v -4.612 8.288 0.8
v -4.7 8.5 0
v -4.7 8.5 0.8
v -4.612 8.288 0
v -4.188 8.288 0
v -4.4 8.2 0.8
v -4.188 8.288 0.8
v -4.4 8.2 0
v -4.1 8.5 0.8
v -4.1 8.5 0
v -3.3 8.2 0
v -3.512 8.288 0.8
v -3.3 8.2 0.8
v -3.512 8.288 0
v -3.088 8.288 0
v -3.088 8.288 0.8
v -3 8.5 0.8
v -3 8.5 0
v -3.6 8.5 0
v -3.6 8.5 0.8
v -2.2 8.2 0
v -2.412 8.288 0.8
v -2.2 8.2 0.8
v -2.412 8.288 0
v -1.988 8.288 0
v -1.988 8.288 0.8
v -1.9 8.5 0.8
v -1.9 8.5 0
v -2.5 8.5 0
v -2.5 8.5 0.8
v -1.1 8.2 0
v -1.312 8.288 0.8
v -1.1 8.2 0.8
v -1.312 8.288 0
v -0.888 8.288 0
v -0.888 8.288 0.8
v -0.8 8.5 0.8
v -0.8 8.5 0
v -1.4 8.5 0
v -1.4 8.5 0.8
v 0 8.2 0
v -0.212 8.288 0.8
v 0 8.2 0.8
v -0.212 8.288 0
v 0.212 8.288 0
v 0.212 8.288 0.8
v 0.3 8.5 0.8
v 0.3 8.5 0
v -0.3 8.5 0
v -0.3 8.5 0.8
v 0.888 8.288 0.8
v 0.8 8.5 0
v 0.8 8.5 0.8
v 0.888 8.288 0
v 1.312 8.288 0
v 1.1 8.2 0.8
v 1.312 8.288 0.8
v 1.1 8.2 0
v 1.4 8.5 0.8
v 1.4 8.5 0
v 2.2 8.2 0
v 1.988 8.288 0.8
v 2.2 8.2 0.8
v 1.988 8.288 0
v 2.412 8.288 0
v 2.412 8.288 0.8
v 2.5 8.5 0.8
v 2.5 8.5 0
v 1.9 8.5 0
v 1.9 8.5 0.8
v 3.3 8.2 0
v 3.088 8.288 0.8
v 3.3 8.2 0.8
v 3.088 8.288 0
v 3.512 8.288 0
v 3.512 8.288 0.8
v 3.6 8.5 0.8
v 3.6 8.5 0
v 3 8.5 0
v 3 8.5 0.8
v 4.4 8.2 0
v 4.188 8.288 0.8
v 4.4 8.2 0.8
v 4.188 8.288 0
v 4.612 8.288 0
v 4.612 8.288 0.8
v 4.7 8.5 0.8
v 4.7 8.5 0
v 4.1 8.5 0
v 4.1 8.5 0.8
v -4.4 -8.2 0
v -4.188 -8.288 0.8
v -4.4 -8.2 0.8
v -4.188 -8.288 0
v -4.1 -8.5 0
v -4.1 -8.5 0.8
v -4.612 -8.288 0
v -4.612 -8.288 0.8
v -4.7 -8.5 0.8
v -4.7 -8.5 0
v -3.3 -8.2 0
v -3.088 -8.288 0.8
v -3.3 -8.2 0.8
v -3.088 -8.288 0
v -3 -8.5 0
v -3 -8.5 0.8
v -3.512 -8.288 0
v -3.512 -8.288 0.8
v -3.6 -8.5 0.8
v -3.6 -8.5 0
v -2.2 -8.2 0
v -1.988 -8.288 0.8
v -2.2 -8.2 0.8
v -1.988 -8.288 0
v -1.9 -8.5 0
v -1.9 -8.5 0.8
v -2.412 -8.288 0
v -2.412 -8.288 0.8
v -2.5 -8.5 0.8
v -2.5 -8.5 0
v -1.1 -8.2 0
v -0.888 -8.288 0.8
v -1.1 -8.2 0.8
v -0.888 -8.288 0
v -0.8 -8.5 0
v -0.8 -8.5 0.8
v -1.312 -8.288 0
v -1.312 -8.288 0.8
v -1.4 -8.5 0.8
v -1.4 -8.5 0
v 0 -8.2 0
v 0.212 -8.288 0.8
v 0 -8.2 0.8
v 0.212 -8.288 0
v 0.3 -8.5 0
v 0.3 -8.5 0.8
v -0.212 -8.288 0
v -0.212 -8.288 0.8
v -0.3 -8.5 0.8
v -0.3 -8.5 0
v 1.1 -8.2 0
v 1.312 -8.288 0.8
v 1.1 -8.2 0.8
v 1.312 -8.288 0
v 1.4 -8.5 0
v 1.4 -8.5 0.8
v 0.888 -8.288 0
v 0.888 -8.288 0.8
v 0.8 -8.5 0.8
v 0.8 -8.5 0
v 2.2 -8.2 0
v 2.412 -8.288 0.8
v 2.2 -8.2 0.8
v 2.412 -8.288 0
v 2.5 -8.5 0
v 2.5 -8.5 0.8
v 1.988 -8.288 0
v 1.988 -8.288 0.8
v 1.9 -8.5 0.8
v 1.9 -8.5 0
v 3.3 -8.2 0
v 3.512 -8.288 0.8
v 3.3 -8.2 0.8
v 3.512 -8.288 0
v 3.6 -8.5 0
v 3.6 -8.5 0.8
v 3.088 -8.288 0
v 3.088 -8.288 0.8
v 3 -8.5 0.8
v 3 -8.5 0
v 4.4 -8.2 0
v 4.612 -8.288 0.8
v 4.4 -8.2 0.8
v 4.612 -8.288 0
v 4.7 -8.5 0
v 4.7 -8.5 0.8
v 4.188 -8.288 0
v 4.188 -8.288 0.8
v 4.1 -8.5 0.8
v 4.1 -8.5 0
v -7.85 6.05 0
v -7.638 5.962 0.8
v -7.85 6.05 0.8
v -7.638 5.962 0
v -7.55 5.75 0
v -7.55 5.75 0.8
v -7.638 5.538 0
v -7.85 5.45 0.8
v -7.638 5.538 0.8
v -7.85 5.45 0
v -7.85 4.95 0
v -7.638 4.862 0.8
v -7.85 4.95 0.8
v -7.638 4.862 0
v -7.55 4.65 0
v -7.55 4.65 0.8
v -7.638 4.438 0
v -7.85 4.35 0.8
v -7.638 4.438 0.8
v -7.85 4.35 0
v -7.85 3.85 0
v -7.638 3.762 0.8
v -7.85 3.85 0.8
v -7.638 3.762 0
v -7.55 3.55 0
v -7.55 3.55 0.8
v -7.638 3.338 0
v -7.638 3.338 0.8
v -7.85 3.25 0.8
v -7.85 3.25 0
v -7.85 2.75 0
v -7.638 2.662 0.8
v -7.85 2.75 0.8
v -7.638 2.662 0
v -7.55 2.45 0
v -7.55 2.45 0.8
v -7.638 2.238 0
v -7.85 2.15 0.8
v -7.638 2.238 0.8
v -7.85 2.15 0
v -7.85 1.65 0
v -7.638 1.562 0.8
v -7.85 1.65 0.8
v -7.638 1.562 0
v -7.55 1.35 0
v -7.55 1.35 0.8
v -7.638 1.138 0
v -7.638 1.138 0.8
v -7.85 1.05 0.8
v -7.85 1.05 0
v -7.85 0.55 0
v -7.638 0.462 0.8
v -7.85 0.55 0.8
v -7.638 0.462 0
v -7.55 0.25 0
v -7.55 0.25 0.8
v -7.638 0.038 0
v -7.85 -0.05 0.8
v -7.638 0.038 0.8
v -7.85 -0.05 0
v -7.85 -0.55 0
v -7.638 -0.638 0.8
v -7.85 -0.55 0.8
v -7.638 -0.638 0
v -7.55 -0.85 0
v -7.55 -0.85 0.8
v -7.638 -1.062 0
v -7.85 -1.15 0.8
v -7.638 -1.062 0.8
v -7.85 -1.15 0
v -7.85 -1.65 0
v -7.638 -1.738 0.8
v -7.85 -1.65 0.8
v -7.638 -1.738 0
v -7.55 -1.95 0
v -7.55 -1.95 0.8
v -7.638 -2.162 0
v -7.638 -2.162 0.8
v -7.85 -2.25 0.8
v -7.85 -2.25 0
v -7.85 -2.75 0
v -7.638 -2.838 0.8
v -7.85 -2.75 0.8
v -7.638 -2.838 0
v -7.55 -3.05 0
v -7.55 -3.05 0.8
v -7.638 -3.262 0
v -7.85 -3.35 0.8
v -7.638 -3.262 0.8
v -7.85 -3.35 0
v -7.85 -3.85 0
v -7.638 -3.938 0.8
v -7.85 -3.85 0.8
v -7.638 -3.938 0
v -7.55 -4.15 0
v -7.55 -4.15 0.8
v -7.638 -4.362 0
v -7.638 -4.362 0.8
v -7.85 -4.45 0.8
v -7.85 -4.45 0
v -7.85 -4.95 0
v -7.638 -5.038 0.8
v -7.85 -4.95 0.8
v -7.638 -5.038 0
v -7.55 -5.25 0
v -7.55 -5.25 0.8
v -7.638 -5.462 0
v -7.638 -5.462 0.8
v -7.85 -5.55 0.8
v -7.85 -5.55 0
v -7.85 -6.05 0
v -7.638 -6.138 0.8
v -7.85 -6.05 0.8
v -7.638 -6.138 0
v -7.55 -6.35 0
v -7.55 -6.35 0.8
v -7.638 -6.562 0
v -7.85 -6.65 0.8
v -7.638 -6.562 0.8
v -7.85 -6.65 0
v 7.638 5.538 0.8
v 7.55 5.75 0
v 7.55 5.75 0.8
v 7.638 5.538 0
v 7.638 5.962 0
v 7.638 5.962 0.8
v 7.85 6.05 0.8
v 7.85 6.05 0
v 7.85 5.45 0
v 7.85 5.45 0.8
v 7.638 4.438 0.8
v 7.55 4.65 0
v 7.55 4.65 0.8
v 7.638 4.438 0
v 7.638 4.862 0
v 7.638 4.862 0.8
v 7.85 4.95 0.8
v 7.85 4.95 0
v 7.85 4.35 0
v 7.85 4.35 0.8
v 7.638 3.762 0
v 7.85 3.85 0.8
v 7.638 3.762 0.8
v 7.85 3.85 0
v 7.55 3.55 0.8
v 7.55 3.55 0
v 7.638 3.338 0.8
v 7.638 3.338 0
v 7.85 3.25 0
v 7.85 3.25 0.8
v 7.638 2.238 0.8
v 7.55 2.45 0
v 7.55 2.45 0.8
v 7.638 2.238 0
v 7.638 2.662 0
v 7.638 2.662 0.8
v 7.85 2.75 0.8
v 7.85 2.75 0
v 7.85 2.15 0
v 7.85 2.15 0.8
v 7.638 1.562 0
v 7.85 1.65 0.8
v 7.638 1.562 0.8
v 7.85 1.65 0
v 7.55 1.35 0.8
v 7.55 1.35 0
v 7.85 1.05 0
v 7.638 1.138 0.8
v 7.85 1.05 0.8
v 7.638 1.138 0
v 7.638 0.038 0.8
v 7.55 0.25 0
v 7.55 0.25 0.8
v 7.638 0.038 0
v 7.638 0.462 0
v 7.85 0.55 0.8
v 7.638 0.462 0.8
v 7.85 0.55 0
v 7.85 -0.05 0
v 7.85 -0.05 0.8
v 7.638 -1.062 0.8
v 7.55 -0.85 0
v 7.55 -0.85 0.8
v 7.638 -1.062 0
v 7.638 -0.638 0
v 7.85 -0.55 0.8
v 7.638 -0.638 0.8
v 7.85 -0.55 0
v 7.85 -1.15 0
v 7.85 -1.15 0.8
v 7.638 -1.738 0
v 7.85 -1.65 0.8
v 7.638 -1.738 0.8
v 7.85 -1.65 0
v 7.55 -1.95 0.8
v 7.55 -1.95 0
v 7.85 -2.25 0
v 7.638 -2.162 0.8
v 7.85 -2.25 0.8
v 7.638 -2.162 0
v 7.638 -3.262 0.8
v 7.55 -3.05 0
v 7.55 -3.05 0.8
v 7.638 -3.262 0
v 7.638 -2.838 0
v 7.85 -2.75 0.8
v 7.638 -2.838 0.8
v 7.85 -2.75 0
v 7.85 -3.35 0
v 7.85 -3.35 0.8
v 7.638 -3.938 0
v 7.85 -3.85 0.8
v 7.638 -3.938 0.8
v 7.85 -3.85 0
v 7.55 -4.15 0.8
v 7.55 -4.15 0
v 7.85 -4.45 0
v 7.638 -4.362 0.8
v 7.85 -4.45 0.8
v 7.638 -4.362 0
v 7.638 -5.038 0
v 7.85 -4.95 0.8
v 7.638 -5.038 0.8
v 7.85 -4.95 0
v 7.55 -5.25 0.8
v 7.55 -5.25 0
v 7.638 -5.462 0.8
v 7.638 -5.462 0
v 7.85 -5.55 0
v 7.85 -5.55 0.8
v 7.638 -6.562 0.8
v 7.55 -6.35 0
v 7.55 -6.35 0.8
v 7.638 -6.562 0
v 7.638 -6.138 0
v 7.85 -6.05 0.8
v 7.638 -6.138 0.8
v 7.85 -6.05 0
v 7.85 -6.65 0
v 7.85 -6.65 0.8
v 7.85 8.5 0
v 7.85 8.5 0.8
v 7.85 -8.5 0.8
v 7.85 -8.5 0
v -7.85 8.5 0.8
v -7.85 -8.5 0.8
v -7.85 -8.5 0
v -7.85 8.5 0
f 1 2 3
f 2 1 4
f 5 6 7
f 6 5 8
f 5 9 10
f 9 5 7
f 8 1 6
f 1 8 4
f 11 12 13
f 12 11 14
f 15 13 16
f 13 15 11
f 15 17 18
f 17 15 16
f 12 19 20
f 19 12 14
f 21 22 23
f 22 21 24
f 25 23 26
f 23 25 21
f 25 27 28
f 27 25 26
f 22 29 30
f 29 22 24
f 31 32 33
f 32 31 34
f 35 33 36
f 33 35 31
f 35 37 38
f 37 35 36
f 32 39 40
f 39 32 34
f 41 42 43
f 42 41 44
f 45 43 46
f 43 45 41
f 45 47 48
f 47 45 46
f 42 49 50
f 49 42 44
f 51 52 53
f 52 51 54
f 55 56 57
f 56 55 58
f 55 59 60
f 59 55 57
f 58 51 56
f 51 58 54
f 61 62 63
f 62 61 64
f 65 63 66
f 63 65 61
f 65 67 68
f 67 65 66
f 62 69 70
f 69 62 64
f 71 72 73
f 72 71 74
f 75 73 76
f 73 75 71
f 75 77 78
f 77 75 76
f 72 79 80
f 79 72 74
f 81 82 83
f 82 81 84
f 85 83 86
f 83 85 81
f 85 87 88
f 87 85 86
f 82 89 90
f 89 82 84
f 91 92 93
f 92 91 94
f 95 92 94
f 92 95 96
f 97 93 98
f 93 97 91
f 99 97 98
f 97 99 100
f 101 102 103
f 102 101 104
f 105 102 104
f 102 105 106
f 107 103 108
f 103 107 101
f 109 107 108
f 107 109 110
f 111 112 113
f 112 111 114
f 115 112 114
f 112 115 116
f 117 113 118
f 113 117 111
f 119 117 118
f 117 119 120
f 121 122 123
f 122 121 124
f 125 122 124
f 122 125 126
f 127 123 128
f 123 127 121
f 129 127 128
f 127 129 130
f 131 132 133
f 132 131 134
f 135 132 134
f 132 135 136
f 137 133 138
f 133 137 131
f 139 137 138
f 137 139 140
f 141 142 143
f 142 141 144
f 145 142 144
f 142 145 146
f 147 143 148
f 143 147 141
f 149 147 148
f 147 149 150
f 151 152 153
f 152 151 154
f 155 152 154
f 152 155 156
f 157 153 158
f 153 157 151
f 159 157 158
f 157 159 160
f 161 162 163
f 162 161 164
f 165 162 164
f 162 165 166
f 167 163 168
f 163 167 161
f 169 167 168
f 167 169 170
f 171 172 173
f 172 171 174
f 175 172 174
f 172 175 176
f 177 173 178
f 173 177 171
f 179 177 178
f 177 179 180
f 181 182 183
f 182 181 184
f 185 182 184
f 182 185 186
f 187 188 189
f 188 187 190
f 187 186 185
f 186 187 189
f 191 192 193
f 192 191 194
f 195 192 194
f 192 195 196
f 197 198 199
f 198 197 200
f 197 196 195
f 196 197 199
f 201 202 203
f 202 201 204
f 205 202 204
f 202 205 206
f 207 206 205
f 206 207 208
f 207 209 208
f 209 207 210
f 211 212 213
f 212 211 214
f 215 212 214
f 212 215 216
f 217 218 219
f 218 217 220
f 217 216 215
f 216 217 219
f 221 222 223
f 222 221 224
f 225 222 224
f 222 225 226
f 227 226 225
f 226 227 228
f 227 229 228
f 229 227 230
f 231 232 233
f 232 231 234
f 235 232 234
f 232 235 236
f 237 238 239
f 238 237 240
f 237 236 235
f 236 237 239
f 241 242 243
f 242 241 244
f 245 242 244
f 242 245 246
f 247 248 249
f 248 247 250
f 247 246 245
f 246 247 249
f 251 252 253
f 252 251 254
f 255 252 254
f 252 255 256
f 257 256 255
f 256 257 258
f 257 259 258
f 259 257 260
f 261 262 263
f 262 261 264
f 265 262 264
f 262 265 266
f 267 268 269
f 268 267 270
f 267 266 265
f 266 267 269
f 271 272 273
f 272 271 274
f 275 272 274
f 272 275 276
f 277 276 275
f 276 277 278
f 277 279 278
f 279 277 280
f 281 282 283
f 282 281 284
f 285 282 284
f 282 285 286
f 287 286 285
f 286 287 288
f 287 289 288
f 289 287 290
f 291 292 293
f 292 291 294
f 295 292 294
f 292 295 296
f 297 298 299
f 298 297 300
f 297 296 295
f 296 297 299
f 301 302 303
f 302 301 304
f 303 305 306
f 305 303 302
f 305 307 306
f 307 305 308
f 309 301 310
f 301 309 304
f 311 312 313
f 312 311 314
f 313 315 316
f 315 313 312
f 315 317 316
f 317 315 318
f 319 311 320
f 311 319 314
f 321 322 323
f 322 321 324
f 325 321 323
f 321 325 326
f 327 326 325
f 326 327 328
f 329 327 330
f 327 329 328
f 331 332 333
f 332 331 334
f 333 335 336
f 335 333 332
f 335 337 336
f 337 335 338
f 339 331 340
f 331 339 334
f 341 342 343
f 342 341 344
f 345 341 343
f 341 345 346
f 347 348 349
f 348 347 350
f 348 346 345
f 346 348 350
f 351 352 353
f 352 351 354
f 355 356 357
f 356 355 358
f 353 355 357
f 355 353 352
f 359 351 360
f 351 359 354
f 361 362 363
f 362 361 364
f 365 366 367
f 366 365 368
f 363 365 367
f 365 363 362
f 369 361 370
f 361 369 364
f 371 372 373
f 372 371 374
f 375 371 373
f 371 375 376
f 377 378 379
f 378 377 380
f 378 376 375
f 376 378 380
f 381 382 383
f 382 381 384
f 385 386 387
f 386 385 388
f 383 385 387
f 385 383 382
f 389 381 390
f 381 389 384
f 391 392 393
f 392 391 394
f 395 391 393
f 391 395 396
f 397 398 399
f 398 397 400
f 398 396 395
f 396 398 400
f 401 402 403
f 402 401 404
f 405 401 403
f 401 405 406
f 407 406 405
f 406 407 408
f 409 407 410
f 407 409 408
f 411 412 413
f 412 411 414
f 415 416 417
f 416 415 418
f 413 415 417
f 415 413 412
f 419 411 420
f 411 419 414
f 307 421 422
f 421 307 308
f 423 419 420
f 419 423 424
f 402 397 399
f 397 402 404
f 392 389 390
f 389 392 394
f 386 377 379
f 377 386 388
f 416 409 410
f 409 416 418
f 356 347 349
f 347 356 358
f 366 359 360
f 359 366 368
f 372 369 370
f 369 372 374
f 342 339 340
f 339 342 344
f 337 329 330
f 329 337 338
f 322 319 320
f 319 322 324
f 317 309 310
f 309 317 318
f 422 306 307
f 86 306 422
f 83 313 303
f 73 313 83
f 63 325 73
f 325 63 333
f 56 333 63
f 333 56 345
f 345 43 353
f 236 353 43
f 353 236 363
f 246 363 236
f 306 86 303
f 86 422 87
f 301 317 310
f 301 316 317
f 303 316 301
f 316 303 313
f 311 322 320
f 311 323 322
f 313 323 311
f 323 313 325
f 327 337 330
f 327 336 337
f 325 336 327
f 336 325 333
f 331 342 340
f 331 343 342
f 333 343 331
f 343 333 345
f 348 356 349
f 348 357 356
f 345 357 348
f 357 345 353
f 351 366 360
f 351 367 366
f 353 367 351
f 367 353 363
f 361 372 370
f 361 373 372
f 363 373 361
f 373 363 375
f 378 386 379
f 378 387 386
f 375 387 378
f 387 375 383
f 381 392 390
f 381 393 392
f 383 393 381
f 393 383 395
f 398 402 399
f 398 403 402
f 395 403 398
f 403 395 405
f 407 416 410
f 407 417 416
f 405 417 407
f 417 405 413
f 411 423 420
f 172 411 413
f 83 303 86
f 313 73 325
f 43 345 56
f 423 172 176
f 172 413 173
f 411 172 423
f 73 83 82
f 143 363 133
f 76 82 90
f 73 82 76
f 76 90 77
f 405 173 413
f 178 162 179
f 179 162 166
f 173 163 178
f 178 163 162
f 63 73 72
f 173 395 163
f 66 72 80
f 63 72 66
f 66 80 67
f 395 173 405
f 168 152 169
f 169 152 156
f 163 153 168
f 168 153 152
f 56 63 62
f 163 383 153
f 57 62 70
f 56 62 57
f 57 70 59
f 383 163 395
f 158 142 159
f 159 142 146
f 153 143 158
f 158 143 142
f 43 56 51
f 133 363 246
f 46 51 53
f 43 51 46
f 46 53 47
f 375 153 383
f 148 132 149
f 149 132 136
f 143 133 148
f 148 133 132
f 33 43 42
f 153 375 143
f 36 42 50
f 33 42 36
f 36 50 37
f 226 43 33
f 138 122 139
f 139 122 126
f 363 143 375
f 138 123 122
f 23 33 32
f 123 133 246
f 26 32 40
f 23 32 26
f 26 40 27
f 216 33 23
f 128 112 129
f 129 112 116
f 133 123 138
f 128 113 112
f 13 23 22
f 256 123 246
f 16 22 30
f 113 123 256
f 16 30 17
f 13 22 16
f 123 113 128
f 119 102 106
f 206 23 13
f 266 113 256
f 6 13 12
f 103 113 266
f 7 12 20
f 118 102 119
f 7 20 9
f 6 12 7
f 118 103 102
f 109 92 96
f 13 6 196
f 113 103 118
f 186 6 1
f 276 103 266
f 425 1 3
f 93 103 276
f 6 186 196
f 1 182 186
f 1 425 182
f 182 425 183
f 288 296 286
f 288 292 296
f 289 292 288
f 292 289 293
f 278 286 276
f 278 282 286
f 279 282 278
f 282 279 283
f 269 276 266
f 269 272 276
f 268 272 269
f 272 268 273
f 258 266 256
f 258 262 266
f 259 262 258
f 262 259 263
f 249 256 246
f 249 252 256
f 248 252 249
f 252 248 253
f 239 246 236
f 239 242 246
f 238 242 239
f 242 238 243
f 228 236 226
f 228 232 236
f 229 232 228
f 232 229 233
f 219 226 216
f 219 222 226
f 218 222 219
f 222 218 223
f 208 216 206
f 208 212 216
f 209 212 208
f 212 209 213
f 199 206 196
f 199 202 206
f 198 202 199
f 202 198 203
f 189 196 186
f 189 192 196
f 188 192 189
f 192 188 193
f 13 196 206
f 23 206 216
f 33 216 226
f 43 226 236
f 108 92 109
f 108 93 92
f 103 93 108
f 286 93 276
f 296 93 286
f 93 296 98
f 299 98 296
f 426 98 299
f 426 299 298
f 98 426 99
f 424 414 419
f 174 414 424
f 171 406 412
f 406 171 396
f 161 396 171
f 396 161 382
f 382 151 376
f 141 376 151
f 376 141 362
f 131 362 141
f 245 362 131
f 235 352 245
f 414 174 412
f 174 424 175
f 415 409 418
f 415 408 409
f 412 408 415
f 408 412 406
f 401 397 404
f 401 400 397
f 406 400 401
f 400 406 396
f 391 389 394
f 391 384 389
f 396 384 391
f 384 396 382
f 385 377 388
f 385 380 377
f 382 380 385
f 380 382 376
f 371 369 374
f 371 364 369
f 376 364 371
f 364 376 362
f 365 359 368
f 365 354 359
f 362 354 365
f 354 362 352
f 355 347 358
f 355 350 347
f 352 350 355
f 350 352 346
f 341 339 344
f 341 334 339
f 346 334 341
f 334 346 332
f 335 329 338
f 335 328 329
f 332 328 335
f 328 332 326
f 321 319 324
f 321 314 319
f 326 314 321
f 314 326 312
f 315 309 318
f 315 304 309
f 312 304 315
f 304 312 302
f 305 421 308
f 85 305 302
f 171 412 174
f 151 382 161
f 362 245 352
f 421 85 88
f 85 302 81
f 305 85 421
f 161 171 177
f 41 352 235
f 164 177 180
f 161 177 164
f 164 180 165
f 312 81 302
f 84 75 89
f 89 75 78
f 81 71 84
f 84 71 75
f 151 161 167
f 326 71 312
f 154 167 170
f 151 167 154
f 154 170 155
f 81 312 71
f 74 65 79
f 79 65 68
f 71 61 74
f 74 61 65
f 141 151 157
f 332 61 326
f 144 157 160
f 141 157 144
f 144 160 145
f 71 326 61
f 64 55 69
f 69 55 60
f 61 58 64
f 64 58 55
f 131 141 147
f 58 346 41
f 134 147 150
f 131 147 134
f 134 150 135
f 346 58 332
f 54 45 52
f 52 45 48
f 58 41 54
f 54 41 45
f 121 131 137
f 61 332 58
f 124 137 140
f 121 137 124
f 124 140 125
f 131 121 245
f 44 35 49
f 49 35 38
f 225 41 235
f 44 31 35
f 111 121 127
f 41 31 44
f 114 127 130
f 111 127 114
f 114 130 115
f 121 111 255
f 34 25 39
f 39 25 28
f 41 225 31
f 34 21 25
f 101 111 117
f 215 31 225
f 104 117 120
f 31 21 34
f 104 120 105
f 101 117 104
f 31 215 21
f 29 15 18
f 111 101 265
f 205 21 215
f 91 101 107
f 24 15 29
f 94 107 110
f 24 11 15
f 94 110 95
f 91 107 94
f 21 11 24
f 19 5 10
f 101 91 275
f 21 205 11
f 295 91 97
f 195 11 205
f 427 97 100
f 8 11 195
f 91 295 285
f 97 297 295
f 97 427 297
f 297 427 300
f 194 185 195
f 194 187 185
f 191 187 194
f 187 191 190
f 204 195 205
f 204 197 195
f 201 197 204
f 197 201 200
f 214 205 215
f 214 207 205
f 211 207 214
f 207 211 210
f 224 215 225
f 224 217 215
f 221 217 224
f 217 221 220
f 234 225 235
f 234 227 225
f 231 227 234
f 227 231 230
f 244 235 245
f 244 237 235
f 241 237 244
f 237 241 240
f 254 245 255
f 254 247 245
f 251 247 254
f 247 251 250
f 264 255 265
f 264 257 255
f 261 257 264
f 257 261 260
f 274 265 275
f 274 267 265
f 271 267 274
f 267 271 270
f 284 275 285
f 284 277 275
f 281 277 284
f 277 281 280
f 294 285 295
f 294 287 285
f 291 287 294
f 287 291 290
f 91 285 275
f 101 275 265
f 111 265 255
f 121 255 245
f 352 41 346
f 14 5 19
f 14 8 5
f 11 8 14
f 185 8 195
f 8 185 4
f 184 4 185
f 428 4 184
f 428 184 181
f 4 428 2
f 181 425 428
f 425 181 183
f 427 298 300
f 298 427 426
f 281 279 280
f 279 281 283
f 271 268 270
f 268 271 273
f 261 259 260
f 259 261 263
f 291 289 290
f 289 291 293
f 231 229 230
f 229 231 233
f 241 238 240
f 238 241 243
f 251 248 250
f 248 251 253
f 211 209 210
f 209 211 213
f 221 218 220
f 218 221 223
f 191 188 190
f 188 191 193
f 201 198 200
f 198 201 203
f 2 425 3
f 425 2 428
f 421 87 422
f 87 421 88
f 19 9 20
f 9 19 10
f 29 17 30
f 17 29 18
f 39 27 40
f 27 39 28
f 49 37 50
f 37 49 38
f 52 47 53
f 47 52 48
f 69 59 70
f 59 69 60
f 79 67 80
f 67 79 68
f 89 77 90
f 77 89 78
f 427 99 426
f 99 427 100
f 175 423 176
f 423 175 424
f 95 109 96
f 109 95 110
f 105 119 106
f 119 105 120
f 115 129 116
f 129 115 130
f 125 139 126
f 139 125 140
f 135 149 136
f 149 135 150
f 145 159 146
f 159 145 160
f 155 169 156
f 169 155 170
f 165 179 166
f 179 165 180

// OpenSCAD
// file: defines.scad
// example012.stl is Mblock.stl, (c) 2009 Will Langford
// licensed under the Creative Commons - GNU GPL license.
// http://www.thingiverse.com/thing:753

//import("sim800c.stl", convexity=3);

// PCB

w = 15.7;
h = 17.0;
pin_fragments = 8;
// main file
// example012.stl is Mblock.stl, (c) 2009 Will Langford
// licensed under the Creative Commons - GNU GPL license.
// http://www.thingiverse.com/thing:753

//import("sim800c.stl", convexity=3);

include <defines.scad>


// Pcb

module Pcb() {
  color("Green")
  translate([-w/2, -h/2])
    cube(size = [w, h, 0.8], center = false);

}

// Pin drill

module PadPin(o_x, o_y, d_x, d_y, cnt) {
  color("Red")
  for(i = [0 : cnt-1]) {
    translate([o_x + i * d_x, o_y + i * d_y, -0.5])
      cylinder(h = 2, r = 0.30, $fn = pin_fragments);
  }
}

module PadDrills() {
    PadPin(-w/2 + 3.45,  h/2, 1.1, 0, 9);
    PadPin(-w/2 + 3.45, -h/2, 1.1, 0, 9);

    PadPin(-w/2, h/2 - 2.75, 0, -1.1, 12);
    PadPin( w/2, h/2 - 2.75, 0, -1.1, 12);
}

// Combine together

/*Pcb();*/
difference() {
  union() {
    Pcb();
  }

	PadDrills();
}
